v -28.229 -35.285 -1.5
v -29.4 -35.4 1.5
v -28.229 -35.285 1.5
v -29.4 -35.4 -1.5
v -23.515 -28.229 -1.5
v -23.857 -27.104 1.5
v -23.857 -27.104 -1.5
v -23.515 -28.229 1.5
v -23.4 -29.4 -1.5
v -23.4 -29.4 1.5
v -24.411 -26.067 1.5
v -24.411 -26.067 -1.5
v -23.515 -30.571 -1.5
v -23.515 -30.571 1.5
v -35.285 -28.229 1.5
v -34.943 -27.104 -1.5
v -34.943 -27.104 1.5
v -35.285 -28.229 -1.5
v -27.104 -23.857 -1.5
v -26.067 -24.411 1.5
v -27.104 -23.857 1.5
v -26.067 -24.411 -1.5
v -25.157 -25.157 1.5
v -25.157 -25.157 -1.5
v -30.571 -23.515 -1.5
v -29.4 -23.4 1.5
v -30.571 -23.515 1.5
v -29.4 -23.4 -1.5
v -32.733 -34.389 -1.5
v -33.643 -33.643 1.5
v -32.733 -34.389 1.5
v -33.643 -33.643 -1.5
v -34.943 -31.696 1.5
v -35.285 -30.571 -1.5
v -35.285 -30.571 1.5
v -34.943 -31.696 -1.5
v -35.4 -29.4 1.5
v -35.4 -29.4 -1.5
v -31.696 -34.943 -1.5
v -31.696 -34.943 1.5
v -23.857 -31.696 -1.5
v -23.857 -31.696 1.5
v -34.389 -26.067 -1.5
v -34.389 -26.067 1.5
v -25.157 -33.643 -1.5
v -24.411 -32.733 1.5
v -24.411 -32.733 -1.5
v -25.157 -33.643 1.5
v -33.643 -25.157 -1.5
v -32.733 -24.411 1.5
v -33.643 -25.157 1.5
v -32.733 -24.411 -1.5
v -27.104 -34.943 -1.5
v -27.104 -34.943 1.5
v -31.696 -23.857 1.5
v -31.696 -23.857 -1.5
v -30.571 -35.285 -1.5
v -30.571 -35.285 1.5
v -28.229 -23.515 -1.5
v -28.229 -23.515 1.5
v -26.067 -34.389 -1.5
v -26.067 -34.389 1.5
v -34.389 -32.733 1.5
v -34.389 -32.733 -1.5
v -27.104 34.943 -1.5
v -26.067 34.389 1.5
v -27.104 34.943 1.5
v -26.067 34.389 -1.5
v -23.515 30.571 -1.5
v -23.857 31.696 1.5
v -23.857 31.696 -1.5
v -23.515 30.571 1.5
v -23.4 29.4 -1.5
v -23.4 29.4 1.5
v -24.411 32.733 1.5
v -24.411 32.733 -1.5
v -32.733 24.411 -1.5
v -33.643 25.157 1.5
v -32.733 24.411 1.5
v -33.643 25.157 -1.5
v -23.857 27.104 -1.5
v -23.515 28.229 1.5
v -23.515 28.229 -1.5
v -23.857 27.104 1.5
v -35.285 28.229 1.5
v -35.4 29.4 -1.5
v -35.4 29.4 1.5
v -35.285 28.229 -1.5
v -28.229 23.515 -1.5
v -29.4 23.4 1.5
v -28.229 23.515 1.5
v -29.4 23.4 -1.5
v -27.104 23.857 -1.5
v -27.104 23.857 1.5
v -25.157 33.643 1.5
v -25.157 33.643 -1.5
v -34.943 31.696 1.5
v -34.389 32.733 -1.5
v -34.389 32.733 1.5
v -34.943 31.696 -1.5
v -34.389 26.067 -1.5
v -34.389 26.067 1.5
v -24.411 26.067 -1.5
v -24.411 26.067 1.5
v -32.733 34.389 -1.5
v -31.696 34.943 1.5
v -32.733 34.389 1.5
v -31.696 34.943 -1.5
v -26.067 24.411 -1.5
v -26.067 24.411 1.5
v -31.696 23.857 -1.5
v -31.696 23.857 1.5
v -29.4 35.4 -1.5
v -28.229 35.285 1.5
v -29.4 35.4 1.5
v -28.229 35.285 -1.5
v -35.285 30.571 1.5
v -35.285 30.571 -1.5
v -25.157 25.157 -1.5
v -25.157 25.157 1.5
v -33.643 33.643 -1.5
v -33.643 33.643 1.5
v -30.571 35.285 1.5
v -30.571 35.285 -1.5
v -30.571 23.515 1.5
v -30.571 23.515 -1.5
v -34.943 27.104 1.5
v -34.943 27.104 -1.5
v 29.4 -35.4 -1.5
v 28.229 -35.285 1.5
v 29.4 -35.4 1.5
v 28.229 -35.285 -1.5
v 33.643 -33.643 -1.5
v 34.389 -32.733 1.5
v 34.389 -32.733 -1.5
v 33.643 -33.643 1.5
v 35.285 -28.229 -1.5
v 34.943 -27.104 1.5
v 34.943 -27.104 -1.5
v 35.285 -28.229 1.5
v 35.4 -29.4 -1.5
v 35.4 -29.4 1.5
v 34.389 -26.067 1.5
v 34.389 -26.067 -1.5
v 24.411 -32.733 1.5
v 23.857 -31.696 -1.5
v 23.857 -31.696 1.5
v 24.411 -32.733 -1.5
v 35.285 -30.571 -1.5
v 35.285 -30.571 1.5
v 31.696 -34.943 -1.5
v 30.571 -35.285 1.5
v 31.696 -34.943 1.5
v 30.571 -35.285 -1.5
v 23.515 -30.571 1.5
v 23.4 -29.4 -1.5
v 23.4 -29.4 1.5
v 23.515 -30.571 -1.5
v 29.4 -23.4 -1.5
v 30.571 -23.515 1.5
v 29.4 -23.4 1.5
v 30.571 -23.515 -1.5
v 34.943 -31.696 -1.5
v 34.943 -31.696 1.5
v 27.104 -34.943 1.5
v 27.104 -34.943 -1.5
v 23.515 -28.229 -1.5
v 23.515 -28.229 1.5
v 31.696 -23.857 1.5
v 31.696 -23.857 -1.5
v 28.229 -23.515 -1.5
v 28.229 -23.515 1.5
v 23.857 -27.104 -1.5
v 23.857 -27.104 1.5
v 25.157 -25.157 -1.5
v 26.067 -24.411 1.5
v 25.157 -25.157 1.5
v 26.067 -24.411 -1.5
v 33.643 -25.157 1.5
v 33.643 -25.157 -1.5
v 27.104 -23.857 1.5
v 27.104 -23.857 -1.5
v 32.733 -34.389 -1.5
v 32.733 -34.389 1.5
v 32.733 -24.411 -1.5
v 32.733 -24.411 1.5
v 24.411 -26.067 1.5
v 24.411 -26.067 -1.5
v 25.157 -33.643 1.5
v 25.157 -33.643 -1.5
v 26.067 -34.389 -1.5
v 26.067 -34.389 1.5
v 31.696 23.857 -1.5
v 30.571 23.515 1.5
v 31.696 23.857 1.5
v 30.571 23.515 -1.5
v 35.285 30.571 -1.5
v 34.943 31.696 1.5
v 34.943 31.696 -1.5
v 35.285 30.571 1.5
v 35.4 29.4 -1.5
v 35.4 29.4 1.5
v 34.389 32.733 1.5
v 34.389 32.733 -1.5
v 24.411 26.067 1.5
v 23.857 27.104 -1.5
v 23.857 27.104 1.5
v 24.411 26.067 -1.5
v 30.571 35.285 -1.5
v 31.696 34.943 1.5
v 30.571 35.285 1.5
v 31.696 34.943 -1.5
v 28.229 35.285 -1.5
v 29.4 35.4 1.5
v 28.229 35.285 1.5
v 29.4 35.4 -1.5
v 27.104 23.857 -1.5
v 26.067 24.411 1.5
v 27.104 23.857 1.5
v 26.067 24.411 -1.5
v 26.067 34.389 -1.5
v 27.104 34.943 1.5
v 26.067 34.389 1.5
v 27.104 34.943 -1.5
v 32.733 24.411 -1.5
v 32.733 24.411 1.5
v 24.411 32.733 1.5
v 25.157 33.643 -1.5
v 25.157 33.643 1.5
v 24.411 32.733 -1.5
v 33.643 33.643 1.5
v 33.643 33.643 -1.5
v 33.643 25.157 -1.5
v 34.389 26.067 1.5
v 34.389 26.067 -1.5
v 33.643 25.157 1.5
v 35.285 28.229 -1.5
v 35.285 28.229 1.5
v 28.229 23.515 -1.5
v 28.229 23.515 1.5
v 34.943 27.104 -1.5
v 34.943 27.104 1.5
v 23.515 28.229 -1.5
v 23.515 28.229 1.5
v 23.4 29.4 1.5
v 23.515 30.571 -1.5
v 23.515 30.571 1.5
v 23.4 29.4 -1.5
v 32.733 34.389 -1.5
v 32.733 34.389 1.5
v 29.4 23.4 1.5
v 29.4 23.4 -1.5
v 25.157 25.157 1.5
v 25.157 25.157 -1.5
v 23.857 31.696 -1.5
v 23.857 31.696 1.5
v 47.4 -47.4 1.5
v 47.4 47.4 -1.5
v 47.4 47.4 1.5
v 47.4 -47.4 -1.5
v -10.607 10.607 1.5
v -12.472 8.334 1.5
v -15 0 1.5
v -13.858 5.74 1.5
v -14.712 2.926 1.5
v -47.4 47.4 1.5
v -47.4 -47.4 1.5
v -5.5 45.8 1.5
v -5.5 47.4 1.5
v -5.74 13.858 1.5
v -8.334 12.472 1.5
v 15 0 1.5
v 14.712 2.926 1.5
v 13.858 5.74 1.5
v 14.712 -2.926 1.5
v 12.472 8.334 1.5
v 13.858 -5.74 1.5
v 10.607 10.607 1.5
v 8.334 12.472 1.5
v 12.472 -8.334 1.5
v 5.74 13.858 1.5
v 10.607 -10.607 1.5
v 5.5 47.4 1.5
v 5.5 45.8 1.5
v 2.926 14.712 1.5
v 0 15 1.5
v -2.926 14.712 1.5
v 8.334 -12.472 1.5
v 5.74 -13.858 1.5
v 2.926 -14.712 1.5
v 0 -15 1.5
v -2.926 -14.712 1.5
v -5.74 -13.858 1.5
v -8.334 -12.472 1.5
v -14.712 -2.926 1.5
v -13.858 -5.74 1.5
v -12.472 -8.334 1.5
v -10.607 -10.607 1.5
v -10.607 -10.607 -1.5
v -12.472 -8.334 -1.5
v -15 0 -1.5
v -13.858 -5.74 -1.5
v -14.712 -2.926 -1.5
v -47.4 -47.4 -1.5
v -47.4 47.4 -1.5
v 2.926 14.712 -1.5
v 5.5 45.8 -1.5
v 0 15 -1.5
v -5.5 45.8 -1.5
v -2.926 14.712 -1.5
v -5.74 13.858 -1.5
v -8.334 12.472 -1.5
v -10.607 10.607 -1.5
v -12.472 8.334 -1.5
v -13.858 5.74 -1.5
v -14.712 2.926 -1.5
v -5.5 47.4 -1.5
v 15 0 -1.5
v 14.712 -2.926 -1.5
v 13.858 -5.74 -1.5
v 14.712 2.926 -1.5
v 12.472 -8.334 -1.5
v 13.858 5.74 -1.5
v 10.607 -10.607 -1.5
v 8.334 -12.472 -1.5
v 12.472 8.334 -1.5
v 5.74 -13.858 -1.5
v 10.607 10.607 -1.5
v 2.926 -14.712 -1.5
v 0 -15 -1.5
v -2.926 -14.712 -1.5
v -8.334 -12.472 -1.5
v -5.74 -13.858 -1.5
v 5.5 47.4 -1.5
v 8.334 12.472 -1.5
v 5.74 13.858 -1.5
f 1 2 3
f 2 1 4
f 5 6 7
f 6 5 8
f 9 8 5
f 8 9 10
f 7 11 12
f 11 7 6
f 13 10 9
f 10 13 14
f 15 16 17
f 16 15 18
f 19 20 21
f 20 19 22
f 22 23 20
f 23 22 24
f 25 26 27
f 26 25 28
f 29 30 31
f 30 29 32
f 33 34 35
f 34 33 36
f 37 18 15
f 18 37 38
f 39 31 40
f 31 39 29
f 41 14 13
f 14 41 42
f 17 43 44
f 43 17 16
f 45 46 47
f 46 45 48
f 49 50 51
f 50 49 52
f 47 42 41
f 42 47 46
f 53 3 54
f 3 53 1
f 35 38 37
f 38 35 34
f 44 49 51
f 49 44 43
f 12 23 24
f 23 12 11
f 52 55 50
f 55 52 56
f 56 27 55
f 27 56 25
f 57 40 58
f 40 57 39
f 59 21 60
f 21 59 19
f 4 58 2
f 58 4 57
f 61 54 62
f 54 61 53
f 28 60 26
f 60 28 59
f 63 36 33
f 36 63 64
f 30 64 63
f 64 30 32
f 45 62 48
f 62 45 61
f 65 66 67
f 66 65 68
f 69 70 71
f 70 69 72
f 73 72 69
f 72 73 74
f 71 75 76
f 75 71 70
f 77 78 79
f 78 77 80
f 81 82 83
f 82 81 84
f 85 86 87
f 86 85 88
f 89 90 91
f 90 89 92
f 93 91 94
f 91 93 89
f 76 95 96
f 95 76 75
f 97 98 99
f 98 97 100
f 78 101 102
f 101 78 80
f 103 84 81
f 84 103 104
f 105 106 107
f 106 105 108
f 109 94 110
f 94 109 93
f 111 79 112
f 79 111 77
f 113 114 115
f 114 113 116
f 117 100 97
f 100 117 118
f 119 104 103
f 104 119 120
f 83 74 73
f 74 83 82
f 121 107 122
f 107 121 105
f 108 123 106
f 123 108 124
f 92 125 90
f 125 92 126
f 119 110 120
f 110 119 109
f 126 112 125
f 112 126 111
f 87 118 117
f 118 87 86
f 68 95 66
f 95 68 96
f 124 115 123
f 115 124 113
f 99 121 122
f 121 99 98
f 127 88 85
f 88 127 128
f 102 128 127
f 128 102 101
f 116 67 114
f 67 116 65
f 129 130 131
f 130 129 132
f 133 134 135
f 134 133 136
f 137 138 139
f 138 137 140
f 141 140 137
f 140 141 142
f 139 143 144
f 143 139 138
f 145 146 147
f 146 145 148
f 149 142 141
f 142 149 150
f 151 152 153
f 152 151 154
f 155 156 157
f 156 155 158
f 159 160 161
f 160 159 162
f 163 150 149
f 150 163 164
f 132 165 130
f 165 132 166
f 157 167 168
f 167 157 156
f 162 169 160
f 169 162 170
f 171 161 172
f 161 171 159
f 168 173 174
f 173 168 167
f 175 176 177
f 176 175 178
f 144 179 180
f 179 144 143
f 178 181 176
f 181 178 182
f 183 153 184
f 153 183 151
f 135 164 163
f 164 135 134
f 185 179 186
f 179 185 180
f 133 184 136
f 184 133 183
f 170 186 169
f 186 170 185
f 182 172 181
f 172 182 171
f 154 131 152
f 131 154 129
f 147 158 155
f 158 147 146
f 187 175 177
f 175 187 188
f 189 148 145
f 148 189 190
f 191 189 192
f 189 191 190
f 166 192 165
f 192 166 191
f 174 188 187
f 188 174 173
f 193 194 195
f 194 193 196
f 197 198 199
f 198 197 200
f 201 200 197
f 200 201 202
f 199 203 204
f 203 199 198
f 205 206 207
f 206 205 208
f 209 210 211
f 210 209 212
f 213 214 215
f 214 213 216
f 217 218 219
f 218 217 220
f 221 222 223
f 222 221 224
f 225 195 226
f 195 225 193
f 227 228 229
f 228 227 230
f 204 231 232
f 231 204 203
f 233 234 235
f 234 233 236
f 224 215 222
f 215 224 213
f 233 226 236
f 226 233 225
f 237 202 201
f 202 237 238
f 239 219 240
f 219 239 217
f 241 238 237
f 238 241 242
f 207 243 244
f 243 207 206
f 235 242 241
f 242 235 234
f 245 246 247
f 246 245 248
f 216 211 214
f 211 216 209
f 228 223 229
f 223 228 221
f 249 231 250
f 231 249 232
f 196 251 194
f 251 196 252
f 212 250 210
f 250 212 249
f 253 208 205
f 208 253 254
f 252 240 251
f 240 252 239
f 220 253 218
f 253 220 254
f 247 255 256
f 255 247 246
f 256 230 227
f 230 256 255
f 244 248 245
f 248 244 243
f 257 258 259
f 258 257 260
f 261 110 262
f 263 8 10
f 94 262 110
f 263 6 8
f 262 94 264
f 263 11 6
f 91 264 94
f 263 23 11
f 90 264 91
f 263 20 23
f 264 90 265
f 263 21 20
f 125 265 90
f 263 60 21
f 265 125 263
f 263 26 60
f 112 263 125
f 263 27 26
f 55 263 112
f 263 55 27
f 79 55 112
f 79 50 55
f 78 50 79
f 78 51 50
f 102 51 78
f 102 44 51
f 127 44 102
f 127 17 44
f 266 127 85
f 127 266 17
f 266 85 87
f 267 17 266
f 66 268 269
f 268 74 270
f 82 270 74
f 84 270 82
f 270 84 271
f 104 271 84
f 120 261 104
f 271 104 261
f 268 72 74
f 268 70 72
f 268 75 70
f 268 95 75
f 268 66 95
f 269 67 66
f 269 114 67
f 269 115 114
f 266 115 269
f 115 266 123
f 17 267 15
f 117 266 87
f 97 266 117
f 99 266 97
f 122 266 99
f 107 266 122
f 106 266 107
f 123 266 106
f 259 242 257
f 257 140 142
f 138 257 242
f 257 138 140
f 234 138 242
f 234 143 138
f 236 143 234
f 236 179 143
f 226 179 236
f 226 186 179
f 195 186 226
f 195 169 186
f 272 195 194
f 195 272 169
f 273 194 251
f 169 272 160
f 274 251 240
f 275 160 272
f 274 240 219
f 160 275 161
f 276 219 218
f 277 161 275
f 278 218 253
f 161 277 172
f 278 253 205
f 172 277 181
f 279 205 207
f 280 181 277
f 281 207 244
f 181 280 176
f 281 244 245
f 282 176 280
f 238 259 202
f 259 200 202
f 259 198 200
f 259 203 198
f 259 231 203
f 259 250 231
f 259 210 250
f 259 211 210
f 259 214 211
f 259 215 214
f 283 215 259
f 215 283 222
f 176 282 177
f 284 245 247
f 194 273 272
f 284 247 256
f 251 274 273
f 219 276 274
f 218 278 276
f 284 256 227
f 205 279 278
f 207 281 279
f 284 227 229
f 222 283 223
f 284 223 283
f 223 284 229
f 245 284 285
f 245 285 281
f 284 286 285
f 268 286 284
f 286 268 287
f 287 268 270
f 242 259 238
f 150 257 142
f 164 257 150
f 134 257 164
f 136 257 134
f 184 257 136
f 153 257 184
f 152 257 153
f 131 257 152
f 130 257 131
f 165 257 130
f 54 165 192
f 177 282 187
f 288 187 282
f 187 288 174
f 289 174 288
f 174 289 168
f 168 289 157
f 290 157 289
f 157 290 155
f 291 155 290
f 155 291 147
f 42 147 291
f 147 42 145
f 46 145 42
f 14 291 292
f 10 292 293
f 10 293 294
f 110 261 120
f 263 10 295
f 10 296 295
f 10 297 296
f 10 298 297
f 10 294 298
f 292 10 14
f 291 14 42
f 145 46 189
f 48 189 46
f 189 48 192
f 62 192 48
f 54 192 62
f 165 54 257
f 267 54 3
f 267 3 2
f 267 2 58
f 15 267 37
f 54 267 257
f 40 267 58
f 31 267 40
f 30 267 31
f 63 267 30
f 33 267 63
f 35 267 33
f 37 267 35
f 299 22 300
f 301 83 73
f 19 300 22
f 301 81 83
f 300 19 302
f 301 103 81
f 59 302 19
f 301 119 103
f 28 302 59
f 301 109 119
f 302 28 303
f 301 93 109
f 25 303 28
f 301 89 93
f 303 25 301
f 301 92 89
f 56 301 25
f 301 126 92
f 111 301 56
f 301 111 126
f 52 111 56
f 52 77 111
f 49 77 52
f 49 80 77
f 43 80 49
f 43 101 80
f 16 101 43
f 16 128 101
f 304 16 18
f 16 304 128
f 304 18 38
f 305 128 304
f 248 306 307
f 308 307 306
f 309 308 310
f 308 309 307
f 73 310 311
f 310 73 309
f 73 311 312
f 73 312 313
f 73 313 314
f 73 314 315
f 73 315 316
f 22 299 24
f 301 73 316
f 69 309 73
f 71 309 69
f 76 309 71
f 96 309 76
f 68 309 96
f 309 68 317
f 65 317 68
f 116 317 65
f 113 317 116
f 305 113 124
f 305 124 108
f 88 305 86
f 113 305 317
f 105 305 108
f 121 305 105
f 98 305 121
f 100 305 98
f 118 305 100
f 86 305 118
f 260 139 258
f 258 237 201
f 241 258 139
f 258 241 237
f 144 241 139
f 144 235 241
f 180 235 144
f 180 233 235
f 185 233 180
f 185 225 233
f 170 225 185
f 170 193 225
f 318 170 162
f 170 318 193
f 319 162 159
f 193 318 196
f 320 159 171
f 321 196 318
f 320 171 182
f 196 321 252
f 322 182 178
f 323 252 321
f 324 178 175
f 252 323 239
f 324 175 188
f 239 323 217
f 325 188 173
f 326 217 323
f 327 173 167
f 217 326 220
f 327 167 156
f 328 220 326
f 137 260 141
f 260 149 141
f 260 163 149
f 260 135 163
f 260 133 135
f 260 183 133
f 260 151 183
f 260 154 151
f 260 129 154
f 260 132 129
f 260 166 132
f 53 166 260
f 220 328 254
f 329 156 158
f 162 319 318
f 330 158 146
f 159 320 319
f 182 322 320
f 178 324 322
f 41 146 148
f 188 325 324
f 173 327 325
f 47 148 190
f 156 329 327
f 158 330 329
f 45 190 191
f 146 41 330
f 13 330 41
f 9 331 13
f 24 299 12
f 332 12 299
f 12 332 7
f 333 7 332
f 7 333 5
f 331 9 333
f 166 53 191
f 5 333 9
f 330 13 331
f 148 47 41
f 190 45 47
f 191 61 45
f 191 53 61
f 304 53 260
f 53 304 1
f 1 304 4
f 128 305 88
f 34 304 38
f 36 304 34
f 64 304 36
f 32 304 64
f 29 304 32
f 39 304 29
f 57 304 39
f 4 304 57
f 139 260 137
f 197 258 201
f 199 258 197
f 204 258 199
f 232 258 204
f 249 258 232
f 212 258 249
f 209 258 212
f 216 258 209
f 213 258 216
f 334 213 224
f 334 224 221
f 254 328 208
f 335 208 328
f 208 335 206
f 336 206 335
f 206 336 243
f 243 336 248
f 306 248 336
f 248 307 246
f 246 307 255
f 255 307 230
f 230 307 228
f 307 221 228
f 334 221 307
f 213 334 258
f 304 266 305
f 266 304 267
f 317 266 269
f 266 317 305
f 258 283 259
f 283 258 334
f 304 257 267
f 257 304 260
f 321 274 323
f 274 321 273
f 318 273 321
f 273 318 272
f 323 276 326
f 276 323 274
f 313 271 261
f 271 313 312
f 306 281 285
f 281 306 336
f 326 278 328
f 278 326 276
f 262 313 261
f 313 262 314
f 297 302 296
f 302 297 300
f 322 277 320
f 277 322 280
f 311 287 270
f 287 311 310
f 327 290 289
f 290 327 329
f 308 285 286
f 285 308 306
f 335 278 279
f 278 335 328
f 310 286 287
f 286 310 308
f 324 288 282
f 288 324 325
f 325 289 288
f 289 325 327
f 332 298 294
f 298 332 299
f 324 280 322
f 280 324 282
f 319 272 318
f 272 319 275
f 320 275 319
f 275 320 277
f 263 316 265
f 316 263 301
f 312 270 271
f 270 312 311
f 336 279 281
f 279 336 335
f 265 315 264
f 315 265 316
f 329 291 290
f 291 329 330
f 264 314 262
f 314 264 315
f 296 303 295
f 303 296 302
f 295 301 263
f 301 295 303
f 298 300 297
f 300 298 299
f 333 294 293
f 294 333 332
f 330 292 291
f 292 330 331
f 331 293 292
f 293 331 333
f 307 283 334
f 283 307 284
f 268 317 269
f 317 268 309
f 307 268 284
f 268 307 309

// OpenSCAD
// CubeSat orta raf — ESP32 + MPU6050 silikonu için düz yüzey
// Gövde içine sürüklenir, ortada kalır; komponentler üstüne silikonlanır.

$fn = 32;

INNER   = 96;    // gövde iç kenar
TOL     =  0.6;  // her kenardan boşluk (toplam 1.2mm — rahat kayar)
THICK   =  3.0;  // raf kalınlığı
HOLE_D  = 12;    // kablo geçiş delikleri çapı
USB_W   = 11;    // USB-C pencere genişliği
USB_H   =  5;    // USB-C pencere yüksekliği

W = INNER - TOL * 2;   // 94.8 mm

difference() {
    cube([W, W, THICK], center = true);

    // kablo geçiş delikleri (4 köşe)
    for (sx = [-1, 1]) for (sy = [-1, 1])
        translate([sx * (W/2 - 18), sy * (W/2 - 18), 0])
            cylinder(d = HOLE_D, h = THICK + 1, center = true);

    // merkez büyük delik (hafifletme + hava sirkülasyonu)
    cylinder(d = 30, h = THICK + 1, center = true);

    // USB-C penceresi (bir kenarda, ESP32'yi çıkarmadan programlamak için)
    translate([0, W/2 - 0.1, 0])
        cube([USB_W, THICK, USB_H], center = true);
}
